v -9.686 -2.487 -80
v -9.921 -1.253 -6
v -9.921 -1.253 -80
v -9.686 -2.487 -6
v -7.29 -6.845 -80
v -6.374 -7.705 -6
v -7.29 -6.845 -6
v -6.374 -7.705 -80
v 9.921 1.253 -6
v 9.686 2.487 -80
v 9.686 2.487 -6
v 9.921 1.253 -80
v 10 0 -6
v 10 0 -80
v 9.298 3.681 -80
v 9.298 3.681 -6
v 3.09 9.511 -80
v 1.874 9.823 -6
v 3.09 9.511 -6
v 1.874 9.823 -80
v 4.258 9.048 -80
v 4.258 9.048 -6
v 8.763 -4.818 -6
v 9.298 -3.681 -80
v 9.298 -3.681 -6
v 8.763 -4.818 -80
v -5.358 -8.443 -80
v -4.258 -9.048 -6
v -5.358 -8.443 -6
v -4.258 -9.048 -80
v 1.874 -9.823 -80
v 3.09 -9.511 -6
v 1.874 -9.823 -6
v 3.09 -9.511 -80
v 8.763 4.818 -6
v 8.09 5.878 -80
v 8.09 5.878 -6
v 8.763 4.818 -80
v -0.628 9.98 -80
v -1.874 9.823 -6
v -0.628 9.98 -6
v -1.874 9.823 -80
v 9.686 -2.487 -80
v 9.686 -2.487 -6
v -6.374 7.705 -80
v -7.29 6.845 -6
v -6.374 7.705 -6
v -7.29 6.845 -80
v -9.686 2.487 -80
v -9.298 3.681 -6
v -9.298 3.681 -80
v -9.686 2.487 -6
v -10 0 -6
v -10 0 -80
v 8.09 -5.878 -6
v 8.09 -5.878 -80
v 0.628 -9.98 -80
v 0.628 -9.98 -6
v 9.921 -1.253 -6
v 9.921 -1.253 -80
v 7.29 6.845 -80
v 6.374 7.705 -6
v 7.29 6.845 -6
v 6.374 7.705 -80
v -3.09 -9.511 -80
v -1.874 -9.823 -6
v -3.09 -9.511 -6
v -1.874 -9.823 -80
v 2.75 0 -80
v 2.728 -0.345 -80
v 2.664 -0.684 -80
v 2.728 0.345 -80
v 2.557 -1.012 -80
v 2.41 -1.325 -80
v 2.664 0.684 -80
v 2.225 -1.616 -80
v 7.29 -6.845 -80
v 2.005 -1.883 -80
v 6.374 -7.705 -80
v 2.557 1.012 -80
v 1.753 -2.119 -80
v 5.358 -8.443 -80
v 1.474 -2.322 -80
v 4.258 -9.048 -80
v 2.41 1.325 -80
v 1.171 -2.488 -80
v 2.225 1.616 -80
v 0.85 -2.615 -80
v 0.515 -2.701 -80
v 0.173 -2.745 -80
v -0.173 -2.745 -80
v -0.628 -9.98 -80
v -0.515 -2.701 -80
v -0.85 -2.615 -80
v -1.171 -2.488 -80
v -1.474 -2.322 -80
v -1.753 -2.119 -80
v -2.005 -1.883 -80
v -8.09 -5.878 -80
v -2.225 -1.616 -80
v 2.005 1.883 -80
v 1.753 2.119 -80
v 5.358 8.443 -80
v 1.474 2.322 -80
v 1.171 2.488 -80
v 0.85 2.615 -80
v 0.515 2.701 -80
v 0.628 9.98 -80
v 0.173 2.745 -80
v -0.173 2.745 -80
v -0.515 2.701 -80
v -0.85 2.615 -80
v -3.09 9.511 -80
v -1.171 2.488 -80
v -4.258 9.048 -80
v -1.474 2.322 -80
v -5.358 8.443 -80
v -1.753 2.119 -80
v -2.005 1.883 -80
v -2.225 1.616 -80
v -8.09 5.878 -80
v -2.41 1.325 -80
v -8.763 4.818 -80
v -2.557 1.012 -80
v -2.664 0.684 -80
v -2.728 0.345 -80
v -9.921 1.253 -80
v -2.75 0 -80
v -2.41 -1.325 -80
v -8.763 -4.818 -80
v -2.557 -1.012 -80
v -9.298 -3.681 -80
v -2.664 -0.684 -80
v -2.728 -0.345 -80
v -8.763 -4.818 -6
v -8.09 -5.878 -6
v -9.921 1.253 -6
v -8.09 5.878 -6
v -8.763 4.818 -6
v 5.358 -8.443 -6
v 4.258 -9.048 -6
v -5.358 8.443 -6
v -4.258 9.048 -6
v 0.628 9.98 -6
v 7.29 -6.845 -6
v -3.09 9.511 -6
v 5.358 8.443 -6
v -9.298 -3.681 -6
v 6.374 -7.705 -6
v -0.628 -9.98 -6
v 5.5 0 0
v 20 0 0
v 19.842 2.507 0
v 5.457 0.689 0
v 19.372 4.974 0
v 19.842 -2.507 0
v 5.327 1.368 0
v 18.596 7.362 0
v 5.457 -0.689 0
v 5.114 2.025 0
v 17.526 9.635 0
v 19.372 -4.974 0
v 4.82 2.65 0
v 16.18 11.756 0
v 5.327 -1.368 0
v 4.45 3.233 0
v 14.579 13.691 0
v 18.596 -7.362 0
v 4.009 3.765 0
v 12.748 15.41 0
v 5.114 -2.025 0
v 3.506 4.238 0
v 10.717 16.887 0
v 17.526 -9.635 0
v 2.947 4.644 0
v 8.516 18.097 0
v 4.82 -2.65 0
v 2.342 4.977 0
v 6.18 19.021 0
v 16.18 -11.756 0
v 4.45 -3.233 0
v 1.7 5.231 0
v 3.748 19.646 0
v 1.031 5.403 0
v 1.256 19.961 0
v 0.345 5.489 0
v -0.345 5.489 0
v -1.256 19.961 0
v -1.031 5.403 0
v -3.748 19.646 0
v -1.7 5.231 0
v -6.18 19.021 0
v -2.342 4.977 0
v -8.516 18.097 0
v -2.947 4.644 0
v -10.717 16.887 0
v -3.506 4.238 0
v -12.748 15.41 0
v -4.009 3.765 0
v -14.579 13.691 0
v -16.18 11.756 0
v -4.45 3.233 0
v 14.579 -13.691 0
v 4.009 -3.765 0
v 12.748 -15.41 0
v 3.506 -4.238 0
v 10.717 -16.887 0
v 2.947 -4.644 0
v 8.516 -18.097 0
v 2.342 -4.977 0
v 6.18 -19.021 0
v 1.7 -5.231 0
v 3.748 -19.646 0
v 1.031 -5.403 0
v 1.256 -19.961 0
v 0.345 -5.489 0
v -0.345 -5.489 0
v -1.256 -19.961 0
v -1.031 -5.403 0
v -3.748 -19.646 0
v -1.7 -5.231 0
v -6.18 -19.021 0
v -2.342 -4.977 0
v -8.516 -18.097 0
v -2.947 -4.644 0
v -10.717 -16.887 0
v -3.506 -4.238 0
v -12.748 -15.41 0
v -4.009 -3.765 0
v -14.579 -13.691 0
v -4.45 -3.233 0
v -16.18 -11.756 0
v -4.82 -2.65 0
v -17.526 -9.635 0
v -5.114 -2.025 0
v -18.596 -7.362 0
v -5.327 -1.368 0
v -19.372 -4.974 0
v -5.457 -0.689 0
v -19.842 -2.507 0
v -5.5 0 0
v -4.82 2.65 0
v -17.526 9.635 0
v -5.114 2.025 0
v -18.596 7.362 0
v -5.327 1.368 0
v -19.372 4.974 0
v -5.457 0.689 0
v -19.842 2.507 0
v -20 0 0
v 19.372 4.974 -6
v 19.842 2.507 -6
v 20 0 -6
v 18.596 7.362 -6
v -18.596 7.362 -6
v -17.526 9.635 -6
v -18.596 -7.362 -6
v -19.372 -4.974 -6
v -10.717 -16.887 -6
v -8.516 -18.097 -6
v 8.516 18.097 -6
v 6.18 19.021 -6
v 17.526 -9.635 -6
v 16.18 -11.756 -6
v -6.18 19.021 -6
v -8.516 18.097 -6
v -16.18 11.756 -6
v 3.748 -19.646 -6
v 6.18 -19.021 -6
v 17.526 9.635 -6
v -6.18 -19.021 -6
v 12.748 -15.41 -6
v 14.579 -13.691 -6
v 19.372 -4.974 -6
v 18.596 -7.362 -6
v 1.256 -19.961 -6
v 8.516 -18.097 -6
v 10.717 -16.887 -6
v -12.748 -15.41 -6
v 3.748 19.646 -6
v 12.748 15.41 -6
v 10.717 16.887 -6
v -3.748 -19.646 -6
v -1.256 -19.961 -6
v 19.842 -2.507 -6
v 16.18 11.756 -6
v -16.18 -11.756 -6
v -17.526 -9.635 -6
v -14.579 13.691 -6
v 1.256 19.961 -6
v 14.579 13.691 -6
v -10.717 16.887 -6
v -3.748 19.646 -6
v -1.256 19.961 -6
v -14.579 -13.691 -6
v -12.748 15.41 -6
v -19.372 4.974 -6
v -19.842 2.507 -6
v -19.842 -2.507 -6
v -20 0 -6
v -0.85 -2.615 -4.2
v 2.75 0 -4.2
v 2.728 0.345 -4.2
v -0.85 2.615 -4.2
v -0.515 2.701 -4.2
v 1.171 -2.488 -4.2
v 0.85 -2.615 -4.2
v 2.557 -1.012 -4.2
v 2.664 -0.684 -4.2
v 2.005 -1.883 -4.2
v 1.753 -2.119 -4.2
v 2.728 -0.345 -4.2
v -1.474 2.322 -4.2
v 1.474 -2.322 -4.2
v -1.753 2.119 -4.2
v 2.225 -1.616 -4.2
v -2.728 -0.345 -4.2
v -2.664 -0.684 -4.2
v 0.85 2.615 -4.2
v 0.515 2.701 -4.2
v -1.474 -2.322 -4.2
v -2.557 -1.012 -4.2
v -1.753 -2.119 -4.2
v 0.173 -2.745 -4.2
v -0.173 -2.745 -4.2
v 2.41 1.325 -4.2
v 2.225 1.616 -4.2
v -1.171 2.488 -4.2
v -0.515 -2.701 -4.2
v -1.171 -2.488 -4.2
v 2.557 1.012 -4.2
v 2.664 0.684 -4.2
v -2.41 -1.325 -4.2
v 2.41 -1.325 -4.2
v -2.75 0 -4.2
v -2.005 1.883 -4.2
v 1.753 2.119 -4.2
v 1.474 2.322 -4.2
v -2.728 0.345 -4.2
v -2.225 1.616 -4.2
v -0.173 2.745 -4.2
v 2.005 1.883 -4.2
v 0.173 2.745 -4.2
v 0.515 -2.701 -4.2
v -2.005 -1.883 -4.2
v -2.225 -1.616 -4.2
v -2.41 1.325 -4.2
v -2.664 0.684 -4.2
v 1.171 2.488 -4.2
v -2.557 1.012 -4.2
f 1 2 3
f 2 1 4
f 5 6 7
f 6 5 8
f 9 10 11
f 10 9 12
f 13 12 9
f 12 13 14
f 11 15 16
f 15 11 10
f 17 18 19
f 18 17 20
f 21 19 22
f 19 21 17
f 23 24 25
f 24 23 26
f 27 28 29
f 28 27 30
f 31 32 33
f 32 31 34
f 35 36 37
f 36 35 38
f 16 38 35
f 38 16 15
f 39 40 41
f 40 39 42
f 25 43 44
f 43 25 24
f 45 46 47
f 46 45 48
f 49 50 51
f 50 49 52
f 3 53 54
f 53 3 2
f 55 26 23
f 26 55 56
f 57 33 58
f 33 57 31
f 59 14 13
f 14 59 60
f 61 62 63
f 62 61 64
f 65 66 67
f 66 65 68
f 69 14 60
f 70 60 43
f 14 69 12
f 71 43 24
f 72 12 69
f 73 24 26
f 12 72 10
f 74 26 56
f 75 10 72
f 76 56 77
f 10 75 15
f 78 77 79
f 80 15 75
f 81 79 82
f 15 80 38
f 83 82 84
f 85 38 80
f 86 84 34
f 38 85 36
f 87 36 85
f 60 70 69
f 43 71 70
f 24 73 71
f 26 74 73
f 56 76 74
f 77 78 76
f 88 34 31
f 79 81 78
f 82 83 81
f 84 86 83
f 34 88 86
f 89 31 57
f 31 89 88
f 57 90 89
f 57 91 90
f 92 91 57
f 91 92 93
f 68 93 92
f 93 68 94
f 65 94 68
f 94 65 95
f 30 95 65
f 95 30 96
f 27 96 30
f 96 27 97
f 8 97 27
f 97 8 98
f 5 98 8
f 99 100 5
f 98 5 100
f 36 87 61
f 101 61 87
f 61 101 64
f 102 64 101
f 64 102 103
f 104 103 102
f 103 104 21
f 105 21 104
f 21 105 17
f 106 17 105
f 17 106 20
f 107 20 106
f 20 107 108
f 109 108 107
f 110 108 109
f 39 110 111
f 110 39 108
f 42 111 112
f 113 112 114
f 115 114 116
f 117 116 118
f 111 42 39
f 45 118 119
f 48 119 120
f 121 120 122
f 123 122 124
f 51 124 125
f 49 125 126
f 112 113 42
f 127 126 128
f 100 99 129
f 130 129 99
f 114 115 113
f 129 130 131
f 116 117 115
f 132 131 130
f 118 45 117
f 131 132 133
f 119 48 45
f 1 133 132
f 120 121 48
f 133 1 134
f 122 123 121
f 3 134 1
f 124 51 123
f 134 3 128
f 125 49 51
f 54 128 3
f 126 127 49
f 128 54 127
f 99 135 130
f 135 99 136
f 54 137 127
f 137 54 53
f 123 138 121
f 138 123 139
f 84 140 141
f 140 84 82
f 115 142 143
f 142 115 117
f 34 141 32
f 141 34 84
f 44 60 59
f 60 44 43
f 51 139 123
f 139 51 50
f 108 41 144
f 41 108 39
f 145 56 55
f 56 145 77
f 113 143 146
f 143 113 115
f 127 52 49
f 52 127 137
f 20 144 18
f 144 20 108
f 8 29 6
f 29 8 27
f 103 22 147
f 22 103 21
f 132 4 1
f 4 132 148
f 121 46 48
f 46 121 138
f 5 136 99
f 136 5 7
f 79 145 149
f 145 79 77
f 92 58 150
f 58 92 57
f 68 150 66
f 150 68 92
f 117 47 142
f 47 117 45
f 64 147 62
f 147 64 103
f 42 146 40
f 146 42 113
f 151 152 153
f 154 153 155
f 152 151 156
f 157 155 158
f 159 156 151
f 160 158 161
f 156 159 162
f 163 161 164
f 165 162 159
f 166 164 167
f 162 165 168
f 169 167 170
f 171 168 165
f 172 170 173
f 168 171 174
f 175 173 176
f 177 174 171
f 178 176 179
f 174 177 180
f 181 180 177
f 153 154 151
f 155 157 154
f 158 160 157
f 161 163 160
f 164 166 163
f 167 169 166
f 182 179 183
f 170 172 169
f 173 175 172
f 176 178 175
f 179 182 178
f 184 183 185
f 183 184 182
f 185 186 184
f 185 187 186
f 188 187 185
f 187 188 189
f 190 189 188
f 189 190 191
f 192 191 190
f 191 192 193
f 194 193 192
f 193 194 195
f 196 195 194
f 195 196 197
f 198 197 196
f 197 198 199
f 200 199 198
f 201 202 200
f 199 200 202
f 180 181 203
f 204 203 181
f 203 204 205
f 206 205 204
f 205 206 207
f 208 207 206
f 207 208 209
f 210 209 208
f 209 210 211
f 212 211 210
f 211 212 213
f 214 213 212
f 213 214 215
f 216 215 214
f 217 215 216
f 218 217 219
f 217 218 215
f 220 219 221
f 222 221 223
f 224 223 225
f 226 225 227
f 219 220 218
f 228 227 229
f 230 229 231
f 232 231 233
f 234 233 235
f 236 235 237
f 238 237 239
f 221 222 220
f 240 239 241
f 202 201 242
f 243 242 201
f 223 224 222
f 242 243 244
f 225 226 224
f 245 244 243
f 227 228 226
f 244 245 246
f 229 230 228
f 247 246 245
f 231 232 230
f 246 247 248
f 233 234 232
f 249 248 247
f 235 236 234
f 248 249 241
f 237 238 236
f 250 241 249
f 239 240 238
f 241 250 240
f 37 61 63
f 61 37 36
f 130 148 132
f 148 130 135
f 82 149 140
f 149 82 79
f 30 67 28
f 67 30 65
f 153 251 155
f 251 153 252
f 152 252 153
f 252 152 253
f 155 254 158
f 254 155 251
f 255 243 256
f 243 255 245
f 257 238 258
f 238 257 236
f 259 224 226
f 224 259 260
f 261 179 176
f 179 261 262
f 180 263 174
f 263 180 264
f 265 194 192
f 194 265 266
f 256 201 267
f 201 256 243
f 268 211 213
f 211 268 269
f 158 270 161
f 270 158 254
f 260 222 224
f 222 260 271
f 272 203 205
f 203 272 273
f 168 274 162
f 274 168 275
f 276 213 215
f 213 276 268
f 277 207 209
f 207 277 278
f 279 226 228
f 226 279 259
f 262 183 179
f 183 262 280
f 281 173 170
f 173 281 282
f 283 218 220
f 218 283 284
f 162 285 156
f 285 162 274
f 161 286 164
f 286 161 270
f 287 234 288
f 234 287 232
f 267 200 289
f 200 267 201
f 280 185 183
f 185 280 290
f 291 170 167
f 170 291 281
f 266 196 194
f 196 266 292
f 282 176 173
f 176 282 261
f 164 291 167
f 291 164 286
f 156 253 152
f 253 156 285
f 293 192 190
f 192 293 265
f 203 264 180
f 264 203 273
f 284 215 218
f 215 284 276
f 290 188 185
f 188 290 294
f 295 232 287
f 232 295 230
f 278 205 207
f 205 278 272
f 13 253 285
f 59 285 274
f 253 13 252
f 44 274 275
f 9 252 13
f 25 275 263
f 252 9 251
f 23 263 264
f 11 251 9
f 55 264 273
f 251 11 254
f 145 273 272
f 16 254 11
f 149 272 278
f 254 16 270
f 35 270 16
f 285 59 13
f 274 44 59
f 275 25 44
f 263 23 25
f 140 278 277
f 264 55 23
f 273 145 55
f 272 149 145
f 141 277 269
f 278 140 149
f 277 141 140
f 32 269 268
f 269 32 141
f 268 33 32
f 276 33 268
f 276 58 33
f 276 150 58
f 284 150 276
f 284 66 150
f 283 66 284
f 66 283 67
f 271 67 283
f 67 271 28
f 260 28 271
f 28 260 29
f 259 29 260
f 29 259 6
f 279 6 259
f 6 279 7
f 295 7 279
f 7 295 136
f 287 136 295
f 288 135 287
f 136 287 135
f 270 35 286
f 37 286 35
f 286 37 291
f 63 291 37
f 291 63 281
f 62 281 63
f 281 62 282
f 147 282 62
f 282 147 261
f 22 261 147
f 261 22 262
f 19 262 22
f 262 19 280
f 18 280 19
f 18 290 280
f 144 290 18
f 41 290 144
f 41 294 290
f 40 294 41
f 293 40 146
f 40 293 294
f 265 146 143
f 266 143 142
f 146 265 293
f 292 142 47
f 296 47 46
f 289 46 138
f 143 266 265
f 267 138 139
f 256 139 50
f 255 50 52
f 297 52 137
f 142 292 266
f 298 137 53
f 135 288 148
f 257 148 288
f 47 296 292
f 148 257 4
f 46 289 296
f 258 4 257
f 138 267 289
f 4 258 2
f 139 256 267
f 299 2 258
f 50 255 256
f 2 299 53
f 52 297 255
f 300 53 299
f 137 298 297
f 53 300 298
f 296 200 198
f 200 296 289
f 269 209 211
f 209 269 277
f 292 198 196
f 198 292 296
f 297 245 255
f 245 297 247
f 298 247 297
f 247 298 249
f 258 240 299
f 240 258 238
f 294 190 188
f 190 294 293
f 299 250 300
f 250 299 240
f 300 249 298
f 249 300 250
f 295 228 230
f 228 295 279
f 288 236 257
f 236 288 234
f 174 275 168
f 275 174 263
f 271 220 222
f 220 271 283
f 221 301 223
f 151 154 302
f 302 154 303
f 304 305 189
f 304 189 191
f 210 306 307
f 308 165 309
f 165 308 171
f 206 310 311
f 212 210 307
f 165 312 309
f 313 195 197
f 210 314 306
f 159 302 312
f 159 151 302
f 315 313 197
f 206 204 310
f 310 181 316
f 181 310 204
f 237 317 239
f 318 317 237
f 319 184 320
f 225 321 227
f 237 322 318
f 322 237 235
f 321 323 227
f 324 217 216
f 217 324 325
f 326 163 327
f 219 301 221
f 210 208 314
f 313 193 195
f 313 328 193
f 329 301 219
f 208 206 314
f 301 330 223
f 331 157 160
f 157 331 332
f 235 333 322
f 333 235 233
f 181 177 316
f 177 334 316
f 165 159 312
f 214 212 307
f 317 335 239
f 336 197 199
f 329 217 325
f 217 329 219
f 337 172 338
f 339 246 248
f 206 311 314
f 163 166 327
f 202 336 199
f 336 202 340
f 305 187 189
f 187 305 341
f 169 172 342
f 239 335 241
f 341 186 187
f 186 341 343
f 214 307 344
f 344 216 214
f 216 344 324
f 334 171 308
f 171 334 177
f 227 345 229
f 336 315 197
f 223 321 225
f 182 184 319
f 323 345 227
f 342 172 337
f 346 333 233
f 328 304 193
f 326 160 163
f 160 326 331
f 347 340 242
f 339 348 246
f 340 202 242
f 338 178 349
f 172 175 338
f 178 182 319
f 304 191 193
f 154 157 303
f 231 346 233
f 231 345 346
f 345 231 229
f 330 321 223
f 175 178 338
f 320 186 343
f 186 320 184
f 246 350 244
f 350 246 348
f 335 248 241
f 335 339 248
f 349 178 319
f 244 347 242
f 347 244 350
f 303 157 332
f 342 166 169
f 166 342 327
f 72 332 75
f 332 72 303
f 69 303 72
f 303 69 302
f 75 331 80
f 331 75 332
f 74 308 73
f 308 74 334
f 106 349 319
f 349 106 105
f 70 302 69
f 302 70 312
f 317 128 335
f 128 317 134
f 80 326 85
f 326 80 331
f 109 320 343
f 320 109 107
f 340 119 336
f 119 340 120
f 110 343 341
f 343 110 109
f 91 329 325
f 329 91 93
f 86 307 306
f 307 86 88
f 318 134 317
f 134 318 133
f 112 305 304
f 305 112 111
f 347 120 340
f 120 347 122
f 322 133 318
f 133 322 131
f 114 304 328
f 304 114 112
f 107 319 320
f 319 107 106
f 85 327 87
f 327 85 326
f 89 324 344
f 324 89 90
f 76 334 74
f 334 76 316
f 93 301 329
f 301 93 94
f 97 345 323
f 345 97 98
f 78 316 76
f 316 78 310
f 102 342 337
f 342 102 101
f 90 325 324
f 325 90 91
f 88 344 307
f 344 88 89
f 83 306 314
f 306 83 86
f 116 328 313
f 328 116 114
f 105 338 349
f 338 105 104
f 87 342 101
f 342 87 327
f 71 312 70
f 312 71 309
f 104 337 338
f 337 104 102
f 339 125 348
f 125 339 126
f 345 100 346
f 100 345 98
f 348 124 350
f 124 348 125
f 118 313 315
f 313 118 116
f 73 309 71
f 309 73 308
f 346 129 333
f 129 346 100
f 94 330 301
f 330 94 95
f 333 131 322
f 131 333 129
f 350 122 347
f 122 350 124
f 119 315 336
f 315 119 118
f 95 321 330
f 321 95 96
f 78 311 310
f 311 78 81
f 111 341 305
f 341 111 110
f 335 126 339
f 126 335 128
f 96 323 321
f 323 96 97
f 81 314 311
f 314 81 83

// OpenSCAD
$fn = 50;


difference() {
	union() {
		translate(v = [0, 0, -80.0000000000]) {
			cylinder(h = 80, r = 10.0000000000);
		}
		translate(v = [0, 0, -6.0000000000]) {
			cylinder(h = 6, r = 20.0000000000);
		}
	}
	union() {
		translate(v = [0, 0, 0]) {
			rotate(a = [0, 0, 0]) {
				difference() {
					union() {
						#translate(v = [0, 0, -80.0000000000]) {
							cylinder(h = 80, r = 2.2500000000);
						}
						#translate(v = [0, 0, -4.2000000000]) {
							cylinder(h = 4.2000000000, r = 10.0000000000, r1 = 2.7500000000, r2 = 5.5000000000);
						}
						#translate(v = [0, 0, -80.0000000000]) {
							cylinder(h = 80, r = 2.7500000000);
						}
						#translate(v = [0, 0, -80.0000000000]) {
							cylinder(h = 80, r = 2.2500000000);
						}
					}
					union();
				}
			}
		}
	}
}
